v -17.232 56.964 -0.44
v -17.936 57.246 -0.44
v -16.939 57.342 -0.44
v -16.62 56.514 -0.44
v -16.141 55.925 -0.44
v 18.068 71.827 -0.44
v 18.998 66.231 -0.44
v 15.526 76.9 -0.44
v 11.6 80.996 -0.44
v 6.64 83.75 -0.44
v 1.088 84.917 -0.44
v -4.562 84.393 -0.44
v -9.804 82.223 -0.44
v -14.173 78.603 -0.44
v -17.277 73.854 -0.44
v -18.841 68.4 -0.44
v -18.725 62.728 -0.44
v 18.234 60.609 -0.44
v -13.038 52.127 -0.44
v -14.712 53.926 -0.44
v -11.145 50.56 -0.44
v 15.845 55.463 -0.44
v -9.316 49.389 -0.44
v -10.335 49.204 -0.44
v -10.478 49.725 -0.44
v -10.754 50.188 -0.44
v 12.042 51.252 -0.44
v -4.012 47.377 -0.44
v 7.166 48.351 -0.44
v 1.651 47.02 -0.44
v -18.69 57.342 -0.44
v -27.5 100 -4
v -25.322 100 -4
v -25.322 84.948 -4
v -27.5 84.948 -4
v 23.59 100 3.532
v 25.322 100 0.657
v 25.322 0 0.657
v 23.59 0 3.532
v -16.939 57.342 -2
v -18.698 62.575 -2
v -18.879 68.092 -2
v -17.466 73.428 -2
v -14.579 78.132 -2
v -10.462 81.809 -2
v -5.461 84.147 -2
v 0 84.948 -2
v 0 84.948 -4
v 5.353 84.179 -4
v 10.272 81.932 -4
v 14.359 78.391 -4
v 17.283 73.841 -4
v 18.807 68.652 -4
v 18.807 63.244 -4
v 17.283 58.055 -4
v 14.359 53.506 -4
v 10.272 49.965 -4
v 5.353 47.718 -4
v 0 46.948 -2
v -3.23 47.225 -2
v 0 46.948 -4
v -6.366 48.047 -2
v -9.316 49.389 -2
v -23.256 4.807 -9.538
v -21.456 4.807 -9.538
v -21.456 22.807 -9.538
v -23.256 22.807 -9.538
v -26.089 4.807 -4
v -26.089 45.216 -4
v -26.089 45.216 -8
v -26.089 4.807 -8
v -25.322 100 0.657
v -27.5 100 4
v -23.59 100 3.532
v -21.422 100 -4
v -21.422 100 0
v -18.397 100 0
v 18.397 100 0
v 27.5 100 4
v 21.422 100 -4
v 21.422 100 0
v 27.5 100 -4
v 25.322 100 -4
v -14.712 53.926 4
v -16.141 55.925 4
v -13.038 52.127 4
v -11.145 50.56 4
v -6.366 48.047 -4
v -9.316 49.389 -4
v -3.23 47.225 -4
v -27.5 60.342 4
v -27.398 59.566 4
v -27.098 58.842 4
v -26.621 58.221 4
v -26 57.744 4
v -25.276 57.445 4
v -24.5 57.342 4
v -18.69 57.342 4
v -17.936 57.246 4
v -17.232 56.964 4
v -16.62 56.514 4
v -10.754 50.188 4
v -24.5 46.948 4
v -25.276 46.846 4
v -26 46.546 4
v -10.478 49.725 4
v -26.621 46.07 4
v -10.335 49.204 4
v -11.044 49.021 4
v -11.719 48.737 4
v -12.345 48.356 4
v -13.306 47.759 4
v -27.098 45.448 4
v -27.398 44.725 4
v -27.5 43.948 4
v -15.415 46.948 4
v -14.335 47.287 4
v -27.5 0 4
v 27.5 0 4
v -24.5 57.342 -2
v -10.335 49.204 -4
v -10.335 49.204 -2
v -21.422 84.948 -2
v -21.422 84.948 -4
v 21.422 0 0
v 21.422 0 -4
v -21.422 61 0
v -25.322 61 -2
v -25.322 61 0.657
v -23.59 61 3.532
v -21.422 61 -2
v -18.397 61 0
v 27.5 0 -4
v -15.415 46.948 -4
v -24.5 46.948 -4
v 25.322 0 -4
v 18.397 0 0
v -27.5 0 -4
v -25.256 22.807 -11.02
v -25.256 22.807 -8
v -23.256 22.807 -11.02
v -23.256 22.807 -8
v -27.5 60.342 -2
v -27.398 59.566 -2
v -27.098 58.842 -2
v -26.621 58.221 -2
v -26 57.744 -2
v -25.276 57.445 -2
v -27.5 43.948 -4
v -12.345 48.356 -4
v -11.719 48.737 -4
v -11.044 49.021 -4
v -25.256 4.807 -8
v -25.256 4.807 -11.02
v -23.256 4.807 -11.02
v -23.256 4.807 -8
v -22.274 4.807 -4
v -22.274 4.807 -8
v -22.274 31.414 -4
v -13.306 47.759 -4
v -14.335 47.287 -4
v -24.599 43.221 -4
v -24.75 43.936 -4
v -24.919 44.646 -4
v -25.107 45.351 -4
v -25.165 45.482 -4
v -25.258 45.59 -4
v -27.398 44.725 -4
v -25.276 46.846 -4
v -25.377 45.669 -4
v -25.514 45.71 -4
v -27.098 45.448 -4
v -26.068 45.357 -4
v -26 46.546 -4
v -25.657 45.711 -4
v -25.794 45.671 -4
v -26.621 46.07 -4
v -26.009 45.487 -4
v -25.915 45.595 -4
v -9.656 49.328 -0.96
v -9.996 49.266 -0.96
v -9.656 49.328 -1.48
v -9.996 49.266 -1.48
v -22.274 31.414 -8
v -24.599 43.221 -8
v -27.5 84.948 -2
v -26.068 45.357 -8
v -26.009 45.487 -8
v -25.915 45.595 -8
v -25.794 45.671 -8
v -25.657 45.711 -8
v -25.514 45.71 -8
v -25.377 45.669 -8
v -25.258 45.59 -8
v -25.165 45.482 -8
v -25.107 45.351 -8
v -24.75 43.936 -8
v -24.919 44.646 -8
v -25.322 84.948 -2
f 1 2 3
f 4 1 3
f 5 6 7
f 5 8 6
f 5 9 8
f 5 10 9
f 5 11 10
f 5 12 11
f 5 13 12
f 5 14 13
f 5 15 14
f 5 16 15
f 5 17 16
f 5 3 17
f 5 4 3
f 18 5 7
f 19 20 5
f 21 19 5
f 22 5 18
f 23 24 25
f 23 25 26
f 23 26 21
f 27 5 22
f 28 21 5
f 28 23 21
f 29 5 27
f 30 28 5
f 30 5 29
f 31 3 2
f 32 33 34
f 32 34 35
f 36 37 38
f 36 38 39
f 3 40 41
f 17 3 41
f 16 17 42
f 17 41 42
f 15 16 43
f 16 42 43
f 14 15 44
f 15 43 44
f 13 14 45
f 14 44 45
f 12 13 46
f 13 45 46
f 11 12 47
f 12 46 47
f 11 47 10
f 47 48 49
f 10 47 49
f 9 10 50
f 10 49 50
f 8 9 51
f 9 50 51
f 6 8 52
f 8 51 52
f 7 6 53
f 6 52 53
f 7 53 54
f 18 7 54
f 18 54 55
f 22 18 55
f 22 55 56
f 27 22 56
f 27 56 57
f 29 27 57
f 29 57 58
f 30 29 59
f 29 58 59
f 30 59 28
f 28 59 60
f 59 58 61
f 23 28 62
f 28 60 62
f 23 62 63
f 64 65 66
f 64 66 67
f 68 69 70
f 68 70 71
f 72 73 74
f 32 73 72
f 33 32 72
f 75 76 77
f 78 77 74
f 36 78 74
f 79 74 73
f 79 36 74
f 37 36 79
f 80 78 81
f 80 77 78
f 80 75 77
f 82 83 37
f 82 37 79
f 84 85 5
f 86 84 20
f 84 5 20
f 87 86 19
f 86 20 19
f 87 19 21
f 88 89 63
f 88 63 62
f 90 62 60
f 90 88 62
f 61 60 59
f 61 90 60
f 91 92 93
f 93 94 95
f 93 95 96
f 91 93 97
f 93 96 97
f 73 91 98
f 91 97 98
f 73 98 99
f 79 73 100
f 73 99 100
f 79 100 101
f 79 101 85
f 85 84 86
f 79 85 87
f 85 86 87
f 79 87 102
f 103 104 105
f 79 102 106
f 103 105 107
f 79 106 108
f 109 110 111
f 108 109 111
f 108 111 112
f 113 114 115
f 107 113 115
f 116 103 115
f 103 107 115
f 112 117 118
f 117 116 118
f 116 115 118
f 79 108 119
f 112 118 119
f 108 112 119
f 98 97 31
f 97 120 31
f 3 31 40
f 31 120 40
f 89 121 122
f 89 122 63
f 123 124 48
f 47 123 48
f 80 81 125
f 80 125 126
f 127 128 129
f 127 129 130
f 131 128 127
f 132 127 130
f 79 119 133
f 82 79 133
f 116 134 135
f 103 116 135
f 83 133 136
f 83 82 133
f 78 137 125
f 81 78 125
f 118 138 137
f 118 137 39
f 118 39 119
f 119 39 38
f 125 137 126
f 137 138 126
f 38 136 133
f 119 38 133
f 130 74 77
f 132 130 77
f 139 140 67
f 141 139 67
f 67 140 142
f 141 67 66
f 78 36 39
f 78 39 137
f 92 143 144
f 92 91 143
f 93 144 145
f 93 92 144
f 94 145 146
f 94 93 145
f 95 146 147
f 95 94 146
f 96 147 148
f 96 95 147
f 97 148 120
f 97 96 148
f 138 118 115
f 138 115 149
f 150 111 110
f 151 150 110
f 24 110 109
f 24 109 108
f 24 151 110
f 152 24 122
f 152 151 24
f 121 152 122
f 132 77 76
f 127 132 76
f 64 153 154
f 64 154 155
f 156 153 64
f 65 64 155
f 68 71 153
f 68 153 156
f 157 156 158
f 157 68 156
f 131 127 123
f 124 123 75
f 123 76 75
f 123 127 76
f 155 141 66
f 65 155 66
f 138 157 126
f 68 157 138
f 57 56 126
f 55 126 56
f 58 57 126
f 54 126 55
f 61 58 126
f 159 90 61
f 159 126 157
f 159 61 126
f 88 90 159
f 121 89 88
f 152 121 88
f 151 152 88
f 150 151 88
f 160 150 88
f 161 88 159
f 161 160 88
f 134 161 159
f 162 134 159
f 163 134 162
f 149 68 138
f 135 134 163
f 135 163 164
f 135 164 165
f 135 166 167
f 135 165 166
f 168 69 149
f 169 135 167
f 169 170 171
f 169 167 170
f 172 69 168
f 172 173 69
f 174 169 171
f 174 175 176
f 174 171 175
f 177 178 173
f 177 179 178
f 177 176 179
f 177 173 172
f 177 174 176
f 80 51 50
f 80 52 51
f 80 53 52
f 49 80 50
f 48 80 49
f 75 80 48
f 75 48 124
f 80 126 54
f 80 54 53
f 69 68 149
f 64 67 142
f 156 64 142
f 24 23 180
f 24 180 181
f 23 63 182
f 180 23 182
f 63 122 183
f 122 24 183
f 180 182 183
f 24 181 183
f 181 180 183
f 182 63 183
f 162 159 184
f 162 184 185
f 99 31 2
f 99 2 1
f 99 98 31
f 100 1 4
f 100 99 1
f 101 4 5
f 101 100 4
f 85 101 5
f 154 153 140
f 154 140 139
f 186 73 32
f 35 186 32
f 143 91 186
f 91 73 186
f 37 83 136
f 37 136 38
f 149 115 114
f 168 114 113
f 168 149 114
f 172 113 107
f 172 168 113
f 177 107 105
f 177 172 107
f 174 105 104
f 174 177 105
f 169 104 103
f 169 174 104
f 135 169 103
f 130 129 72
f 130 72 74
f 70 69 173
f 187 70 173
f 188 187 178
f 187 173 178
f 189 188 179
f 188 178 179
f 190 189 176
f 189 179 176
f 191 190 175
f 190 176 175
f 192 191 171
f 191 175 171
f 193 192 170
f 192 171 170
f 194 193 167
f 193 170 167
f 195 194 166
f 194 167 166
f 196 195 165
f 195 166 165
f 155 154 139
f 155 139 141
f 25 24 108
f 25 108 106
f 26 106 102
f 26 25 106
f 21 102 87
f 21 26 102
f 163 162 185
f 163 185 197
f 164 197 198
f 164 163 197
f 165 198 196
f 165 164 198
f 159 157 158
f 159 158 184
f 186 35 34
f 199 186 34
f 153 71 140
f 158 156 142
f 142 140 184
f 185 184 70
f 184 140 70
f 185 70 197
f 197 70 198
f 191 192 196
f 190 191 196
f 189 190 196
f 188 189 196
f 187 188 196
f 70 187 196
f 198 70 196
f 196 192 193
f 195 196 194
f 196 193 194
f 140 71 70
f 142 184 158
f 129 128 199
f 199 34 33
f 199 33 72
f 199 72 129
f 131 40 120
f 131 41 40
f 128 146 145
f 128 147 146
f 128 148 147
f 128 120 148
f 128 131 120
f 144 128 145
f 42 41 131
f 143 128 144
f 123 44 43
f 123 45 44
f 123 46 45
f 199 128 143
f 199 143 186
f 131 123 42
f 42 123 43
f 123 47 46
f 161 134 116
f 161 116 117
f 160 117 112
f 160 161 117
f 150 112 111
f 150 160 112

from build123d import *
from build123d.topology import SkipClean

# Parameters (mm, degrees)
SKETCH1_W           = 55
SKETCH1_H           = 8
BOSS_EXTRUDE1_DEPTH = 100
SKETCH4_R           = 19
CUT_EXTRUDE3_DEPTH  = 3.56
CUT_EXTRUDE4_DEPTH  = 2
CUT_EXTRUDE5_DEPTH  = 16
BOSS_EXTRUDE2_START = 2
BOSS_EXTRUDE2_DEPTH = 2
FILLET1_R           = 3
FILLET2_R           = 3
FILLET3_R           = 3
FILLET4_R           = 2
BOSS_EXTRUDE3_DEPTH = 4
CUT_EXTRUDE9_DEPTH  = 39
CUT_EXTRUDE13_DEPTH = 108
BOSS_EXTRUDE4_DEPTH = 18
FILLET5_R           = 0.5


with BuildPart() as part:
    # Sketch1 → Boss-Extrude1 (new body)
    with BuildSketch(Plane(origin=(0, 0, 0), x_dir=(1, 0, 0), z_dir=(0, 1, 0))):
        Rectangle(SKETCH1_W, SKETCH1_H)
    extrude(amount=BOSS_EXTRUDE1_DEPTH)

    # Sketch4 → Cut-Extrude3 (cut)
    with BuildSketch(Plane(origin=(0, 0, -4), x_dir=(-1, 0, 0), z_dir=(0, 0, -1))):
        with Locations((0, 65.948341349)):
            Circle(SKETCH4_R)
    extrude(amount=-CUT_EXTRUDE3_DEPTH, mode=Mode.SUBTRACT)

    # Sketch5 → Cut-Extrude4 (cut)
    with BuildSketch(Plane(origin=(0, 0, -4), x_dir=(-1, 0, 0), z_dir=(0, 0, -1))):
        with BuildLine():
            Line((0, 46.948341349), (27.5, 46.948341349))
            Line((27.5, 46.948341349), (27.5, 84.948341349))
            Line((27.5, 84.948341349), (0, 84.948341349))
            ThreePointArc((0, 84.948341349), (19, 65.948341349), (0, 46.948341349))
        make_face()
    extrude(amount=-CUT_EXTRUDE4_DEPTH, mode=Mode.SUBTRACT)

    # Sketch6 → Cut-Extrude5 (cut)
    with BuildSketch(Plane(origin=(0, 0, -2), x_dir=(-1, 0, 0), z_dir=(0, 0, -1))):
        with BuildLine():
            Line((15.414617012, 46.948341349), (27.5, 46.948341349))
            Line((27.5, 46.948341349), (27.5, 57.34244177))
            Line((27.5, 57.34244177), (16.93925891, 57.34244177))
            ThreePointArc((16.93925891, 57.34244177), (13.716933305, 52.801260277), (9.316482273, 49.389260515))
            add(Edge.make_bspline(
                [(9.316482273, 49.389260515), (9.656060905, 49.327672788), (9.995639536, 49.266085061), (10.335218168, 49.204497334)],
                knots=[0, 0, 0, 0, 0.453327557, 0.453327557, 0.453327557, 0.453327557], degree=3))
            ThreePointArc((10.335218168, 49.204497334), (11.386910009, 48.891383158), (12.344973185, 48.356396089))
            ThreePointArc((12.344973185, 48.356396089), (13.813009587, 47.506772296), (15.414617012, 46.948341349))
        make_face()
    extrude(amount=-CUT_EXTRUDE5_DEPTH, mode=Mode.SUBTRACT)

    # Sketch7 → Boss-Extrude2 (add)
    with BuildSketch(Plane(origin=(0, 0, -2), x_dir=(-1, 0, 0), z_dir=(0, 0, -1)).offset(BOSS_EXTRUDE2_START)):
        with BuildLine():
            Line((0, 46.948341349), (15.414617012, 46.948341349))
            ThreePointArc((15.414617012, 46.948341349), (13.813009587, 47.506772296), (12.344973185, 48.356396089))
            ThreePointArc((12.344973185, 48.356396089), (11.386910009, 48.891383158), (10.335218168, 49.204497334))
            Line((10.335218168, 49.204497334), (9.316482273, 49.389260515))
            ThreePointArc((9.316482273, 49.389260515), (4.815468002, 47.568698591), (0, 46.948341349))
        make_face()
    extrude(amount=-BOSS_EXTRUDE2_DEPTH)

    # Fillet1
    fillet1_edges = [part.edges().sort_by_distance(p)[0] for p in [
        (-27.5, 46.948341349, 0),
    ]]
    fillet(fillet1_edges, radius=FILLET1_R)

    # Fillet2
    fillet2_edges = [part.edges().sort_by_distance(p)[0] for p in [
        (-27.5, 57.34244177, 1),
    ]]
    fillet(fillet2_edges, radius=FILLET2_R)

    # Fillet3
    fillet3_edges = [part.edges().sort_by_distance(p)[0] for p in [
        (-16.93925891, 57.34244177, 1.78),
    ]]
    fillet(fillet3_edges, radius=FILLET3_R)

    # Fillet4
    # the kernel refuses this fillet: 2 mm, written as the material it adds along each edge
    with BuildSketch(Plane(origin=(-9.316482273, 49.389260515, -0.44), x_dir=(-0.8420947177301665, 0.5393296639078471, 0), z_dir=(0, 0, 1))) as fillet4_piece_1:
        with BuildLine():
            CenterArc((2.285143138, 1.996733658), FILLET4_R, 220.22985095, 46.495139538)
            Line((0.758223851, 0.705022587), (0, 0))
            ThreePointArc((0, 0), (1.08544299, 0.031030246), (2.170885981, 0))
        make_face()
    extrude(amount=4.44)

    # Sketch8 → Boss-Extrude3 (add)
    with SkipClean():  # the faces are left unmerged after this step: merging them gives an invalid solid
        with BuildSketch(Plane(origin=(0, 0, -4), x_dir=(-1, 0, 0), z_dir=(0, 0, -1))):
            with BuildLine():
                Line((26.088640722, 4.806504153), (22.273821869, 4.806504153))
                Line((22.273821869, 4.806504153), (22.273821869, 31.413664101))
                Line((22.273821869, 31.413664101), (24.599018881, 43.221316386))
                ThreePointArc((24.599018881, 43.221316386), (25.224862201, 45.756953754), (26.088640722, 48.221710007))
                Line((26.088640722, 48.221710007), (26.088640722, 4.806504153))
            make_face()
        extrude(amount=BOSS_EXTRUDE3_DEPTH)

    # Sketch10 → Cut-Extrude9 (cut)
    with SkipClean():  # the faces are left unmerged after this step: merging them gives an invalid solid
        with BuildSketch(Plane(origin=(0, 100, 0), x_dir=(1, 0, 0), z_dir=(0, 1, 0))):
            Polygon((-21.421951451, 4), (-25.321951451, 4), (-25.321951451, -0.657162479), (-23.589826686, -3.532235176), (-18.397407116, 0), (-21.421951451, 0), align=None)
        extrude(amount=-CUT_EXTRUDE9_DEPTH, mode=Mode.SUBTRACT)

    # Sketch11 → Cut-Extrude13 (cut)
    with SkipClean():  # the faces are left unmerged after this step: merging them gives an invalid solid
        with BuildSketch(Plane(origin=(0, 100, 0), x_dir=(1, 0, 0), z_dir=(0, 1, 0))):
            Polygon((21.421951451, 4), (25.321951451, 4), (25.321951451, -0.657162479), (23.589826686, -3.532235176), (18.397407116, 0), (21.421951451, 0), align=None)
        extrude(amount=-CUT_EXTRUDE13_DEPTH, mode=Mode.SUBTRACT)

    # Sketch12 → Boss-Extrude4 (add)
    with SkipClean():  # the faces are left unmerged after this step: merging them gives an invalid solid
        with BuildSketch(Plane.XZ.offset(-4.806504153)):
            Polygon((-23.25622165, -11.019758414), (-21.45622165, -9.537592081), (-23.25622165, -9.537592081), (-23.25622165, -8), (-25.25622165, -8), (-25.25622165, -9.537592081), (-25.25622165, -11.019758414), align=None)
        extrude(amount=-BOSS_EXTRUDE4_DEPTH)

    # Fillet5
    # the kernel refuses this fillet: 0.5 mm, written as the material it takes off along each edge
    with BuildSketch(Plane(origin=(-26.088640722, 48.221710007, -4), x_dir=(0, -1, 0), z_dir=(0, 0, -1))) as fillet5_piece_1:
        with BuildLine():
            CenterArc((3.006099278, -0.5), FILLET5_R, 90, 164.292569468)
            ThreePointArc((2.870736632, -0.981328322), (1.421812921, -0.530318544), (0, 0))
            Line((0, 0), (3.006099278, 0))
        make_face()
    extrude(amount=11.584578962, mode=Mode.SUBTRACT)


solid = part.part
